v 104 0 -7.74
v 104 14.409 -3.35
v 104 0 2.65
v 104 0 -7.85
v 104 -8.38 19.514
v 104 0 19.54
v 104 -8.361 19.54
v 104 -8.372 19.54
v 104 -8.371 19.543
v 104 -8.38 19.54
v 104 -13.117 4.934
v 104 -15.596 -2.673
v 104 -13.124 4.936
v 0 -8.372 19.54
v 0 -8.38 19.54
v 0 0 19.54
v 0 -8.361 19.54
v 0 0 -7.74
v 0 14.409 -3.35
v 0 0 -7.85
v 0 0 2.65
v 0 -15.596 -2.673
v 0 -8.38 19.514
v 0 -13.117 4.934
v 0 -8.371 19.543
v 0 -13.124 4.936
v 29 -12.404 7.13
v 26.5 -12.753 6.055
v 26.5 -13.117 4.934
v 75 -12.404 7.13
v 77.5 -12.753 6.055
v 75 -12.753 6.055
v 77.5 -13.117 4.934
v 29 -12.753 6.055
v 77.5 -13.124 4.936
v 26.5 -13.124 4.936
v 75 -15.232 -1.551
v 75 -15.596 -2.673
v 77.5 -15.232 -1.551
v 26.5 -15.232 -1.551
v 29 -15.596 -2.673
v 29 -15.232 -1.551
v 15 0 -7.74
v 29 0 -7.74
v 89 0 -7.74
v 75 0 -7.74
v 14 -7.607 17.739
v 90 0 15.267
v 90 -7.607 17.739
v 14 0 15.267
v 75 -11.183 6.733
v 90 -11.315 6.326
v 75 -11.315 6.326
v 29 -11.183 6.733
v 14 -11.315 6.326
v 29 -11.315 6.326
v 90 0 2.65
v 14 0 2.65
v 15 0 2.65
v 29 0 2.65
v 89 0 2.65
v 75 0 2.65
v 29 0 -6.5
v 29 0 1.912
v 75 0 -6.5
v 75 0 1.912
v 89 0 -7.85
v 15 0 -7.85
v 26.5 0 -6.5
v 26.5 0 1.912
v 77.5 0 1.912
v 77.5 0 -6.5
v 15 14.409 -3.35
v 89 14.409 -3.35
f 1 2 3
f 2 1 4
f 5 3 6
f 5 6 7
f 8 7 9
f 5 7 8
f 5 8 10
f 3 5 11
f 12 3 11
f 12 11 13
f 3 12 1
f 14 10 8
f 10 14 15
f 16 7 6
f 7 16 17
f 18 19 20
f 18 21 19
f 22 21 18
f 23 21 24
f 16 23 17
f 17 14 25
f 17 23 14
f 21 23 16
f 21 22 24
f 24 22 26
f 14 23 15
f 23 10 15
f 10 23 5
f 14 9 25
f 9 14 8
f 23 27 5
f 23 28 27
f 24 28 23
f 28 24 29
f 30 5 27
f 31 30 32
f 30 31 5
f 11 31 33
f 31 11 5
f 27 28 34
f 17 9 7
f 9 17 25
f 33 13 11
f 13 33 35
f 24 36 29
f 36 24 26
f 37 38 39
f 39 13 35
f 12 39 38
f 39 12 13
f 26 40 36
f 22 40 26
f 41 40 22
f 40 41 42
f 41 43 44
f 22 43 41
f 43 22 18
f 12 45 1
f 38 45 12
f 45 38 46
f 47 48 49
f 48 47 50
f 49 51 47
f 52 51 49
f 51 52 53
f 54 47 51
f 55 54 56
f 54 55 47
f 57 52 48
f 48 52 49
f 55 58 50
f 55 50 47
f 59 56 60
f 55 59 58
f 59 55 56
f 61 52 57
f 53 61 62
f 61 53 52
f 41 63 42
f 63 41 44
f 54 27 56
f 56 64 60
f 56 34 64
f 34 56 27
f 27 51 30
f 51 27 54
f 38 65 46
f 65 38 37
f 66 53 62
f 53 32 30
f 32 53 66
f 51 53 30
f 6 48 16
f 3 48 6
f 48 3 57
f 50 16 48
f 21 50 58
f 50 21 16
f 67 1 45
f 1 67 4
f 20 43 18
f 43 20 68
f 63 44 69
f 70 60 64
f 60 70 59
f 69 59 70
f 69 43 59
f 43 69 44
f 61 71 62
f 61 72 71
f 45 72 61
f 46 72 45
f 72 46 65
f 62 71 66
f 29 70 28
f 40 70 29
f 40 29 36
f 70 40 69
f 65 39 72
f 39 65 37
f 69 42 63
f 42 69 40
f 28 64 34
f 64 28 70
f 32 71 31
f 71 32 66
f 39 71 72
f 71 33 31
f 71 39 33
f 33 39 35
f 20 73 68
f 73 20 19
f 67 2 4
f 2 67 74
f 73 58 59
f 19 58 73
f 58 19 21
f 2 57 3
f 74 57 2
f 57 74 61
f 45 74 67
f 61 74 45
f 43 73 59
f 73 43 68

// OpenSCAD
//LED housing UVA top

module UVA_housing() {
difference() {
union() {
translate([0,-8.38,14.54]) 
    cube([104,10,5]);
    rotate ([72,0,0]) cube([104,16,14]); 
    translate([0, 0.8, -8]) rotate([72,0,0])
    color("red") {
    cube([104,8,17.24]); }
    }
color("yellow") {
    translate([14,2,2]) rotate([72,0,0]) 
    cube([76,12,14]);
    }
color("blue") {
    translate([29, 4, 1.8]) rotate([162,0,0]) 
    cube ([46,18,12]); }
    translate([0,0,-8])
    cube([104,20,28]);
    translate([26.5,0,-6.5]) rotate([72,0,0])
    cube([51,8,25.5]);
    }
}

//Support for UVA board
module UVA_support() {
difference() {
    rotate([0,90,0]) translate([-2.65,0,0])
linear_extrude(height = 104, scale = 1) 
polygon(points=[[0,0],[10.5,0],[6, 14.409]]);
    rotate([0,90,0]) translate([-5,0,15])
    cube([40,30,74]);
    }
}
UVA_housing();
UVA_support();
